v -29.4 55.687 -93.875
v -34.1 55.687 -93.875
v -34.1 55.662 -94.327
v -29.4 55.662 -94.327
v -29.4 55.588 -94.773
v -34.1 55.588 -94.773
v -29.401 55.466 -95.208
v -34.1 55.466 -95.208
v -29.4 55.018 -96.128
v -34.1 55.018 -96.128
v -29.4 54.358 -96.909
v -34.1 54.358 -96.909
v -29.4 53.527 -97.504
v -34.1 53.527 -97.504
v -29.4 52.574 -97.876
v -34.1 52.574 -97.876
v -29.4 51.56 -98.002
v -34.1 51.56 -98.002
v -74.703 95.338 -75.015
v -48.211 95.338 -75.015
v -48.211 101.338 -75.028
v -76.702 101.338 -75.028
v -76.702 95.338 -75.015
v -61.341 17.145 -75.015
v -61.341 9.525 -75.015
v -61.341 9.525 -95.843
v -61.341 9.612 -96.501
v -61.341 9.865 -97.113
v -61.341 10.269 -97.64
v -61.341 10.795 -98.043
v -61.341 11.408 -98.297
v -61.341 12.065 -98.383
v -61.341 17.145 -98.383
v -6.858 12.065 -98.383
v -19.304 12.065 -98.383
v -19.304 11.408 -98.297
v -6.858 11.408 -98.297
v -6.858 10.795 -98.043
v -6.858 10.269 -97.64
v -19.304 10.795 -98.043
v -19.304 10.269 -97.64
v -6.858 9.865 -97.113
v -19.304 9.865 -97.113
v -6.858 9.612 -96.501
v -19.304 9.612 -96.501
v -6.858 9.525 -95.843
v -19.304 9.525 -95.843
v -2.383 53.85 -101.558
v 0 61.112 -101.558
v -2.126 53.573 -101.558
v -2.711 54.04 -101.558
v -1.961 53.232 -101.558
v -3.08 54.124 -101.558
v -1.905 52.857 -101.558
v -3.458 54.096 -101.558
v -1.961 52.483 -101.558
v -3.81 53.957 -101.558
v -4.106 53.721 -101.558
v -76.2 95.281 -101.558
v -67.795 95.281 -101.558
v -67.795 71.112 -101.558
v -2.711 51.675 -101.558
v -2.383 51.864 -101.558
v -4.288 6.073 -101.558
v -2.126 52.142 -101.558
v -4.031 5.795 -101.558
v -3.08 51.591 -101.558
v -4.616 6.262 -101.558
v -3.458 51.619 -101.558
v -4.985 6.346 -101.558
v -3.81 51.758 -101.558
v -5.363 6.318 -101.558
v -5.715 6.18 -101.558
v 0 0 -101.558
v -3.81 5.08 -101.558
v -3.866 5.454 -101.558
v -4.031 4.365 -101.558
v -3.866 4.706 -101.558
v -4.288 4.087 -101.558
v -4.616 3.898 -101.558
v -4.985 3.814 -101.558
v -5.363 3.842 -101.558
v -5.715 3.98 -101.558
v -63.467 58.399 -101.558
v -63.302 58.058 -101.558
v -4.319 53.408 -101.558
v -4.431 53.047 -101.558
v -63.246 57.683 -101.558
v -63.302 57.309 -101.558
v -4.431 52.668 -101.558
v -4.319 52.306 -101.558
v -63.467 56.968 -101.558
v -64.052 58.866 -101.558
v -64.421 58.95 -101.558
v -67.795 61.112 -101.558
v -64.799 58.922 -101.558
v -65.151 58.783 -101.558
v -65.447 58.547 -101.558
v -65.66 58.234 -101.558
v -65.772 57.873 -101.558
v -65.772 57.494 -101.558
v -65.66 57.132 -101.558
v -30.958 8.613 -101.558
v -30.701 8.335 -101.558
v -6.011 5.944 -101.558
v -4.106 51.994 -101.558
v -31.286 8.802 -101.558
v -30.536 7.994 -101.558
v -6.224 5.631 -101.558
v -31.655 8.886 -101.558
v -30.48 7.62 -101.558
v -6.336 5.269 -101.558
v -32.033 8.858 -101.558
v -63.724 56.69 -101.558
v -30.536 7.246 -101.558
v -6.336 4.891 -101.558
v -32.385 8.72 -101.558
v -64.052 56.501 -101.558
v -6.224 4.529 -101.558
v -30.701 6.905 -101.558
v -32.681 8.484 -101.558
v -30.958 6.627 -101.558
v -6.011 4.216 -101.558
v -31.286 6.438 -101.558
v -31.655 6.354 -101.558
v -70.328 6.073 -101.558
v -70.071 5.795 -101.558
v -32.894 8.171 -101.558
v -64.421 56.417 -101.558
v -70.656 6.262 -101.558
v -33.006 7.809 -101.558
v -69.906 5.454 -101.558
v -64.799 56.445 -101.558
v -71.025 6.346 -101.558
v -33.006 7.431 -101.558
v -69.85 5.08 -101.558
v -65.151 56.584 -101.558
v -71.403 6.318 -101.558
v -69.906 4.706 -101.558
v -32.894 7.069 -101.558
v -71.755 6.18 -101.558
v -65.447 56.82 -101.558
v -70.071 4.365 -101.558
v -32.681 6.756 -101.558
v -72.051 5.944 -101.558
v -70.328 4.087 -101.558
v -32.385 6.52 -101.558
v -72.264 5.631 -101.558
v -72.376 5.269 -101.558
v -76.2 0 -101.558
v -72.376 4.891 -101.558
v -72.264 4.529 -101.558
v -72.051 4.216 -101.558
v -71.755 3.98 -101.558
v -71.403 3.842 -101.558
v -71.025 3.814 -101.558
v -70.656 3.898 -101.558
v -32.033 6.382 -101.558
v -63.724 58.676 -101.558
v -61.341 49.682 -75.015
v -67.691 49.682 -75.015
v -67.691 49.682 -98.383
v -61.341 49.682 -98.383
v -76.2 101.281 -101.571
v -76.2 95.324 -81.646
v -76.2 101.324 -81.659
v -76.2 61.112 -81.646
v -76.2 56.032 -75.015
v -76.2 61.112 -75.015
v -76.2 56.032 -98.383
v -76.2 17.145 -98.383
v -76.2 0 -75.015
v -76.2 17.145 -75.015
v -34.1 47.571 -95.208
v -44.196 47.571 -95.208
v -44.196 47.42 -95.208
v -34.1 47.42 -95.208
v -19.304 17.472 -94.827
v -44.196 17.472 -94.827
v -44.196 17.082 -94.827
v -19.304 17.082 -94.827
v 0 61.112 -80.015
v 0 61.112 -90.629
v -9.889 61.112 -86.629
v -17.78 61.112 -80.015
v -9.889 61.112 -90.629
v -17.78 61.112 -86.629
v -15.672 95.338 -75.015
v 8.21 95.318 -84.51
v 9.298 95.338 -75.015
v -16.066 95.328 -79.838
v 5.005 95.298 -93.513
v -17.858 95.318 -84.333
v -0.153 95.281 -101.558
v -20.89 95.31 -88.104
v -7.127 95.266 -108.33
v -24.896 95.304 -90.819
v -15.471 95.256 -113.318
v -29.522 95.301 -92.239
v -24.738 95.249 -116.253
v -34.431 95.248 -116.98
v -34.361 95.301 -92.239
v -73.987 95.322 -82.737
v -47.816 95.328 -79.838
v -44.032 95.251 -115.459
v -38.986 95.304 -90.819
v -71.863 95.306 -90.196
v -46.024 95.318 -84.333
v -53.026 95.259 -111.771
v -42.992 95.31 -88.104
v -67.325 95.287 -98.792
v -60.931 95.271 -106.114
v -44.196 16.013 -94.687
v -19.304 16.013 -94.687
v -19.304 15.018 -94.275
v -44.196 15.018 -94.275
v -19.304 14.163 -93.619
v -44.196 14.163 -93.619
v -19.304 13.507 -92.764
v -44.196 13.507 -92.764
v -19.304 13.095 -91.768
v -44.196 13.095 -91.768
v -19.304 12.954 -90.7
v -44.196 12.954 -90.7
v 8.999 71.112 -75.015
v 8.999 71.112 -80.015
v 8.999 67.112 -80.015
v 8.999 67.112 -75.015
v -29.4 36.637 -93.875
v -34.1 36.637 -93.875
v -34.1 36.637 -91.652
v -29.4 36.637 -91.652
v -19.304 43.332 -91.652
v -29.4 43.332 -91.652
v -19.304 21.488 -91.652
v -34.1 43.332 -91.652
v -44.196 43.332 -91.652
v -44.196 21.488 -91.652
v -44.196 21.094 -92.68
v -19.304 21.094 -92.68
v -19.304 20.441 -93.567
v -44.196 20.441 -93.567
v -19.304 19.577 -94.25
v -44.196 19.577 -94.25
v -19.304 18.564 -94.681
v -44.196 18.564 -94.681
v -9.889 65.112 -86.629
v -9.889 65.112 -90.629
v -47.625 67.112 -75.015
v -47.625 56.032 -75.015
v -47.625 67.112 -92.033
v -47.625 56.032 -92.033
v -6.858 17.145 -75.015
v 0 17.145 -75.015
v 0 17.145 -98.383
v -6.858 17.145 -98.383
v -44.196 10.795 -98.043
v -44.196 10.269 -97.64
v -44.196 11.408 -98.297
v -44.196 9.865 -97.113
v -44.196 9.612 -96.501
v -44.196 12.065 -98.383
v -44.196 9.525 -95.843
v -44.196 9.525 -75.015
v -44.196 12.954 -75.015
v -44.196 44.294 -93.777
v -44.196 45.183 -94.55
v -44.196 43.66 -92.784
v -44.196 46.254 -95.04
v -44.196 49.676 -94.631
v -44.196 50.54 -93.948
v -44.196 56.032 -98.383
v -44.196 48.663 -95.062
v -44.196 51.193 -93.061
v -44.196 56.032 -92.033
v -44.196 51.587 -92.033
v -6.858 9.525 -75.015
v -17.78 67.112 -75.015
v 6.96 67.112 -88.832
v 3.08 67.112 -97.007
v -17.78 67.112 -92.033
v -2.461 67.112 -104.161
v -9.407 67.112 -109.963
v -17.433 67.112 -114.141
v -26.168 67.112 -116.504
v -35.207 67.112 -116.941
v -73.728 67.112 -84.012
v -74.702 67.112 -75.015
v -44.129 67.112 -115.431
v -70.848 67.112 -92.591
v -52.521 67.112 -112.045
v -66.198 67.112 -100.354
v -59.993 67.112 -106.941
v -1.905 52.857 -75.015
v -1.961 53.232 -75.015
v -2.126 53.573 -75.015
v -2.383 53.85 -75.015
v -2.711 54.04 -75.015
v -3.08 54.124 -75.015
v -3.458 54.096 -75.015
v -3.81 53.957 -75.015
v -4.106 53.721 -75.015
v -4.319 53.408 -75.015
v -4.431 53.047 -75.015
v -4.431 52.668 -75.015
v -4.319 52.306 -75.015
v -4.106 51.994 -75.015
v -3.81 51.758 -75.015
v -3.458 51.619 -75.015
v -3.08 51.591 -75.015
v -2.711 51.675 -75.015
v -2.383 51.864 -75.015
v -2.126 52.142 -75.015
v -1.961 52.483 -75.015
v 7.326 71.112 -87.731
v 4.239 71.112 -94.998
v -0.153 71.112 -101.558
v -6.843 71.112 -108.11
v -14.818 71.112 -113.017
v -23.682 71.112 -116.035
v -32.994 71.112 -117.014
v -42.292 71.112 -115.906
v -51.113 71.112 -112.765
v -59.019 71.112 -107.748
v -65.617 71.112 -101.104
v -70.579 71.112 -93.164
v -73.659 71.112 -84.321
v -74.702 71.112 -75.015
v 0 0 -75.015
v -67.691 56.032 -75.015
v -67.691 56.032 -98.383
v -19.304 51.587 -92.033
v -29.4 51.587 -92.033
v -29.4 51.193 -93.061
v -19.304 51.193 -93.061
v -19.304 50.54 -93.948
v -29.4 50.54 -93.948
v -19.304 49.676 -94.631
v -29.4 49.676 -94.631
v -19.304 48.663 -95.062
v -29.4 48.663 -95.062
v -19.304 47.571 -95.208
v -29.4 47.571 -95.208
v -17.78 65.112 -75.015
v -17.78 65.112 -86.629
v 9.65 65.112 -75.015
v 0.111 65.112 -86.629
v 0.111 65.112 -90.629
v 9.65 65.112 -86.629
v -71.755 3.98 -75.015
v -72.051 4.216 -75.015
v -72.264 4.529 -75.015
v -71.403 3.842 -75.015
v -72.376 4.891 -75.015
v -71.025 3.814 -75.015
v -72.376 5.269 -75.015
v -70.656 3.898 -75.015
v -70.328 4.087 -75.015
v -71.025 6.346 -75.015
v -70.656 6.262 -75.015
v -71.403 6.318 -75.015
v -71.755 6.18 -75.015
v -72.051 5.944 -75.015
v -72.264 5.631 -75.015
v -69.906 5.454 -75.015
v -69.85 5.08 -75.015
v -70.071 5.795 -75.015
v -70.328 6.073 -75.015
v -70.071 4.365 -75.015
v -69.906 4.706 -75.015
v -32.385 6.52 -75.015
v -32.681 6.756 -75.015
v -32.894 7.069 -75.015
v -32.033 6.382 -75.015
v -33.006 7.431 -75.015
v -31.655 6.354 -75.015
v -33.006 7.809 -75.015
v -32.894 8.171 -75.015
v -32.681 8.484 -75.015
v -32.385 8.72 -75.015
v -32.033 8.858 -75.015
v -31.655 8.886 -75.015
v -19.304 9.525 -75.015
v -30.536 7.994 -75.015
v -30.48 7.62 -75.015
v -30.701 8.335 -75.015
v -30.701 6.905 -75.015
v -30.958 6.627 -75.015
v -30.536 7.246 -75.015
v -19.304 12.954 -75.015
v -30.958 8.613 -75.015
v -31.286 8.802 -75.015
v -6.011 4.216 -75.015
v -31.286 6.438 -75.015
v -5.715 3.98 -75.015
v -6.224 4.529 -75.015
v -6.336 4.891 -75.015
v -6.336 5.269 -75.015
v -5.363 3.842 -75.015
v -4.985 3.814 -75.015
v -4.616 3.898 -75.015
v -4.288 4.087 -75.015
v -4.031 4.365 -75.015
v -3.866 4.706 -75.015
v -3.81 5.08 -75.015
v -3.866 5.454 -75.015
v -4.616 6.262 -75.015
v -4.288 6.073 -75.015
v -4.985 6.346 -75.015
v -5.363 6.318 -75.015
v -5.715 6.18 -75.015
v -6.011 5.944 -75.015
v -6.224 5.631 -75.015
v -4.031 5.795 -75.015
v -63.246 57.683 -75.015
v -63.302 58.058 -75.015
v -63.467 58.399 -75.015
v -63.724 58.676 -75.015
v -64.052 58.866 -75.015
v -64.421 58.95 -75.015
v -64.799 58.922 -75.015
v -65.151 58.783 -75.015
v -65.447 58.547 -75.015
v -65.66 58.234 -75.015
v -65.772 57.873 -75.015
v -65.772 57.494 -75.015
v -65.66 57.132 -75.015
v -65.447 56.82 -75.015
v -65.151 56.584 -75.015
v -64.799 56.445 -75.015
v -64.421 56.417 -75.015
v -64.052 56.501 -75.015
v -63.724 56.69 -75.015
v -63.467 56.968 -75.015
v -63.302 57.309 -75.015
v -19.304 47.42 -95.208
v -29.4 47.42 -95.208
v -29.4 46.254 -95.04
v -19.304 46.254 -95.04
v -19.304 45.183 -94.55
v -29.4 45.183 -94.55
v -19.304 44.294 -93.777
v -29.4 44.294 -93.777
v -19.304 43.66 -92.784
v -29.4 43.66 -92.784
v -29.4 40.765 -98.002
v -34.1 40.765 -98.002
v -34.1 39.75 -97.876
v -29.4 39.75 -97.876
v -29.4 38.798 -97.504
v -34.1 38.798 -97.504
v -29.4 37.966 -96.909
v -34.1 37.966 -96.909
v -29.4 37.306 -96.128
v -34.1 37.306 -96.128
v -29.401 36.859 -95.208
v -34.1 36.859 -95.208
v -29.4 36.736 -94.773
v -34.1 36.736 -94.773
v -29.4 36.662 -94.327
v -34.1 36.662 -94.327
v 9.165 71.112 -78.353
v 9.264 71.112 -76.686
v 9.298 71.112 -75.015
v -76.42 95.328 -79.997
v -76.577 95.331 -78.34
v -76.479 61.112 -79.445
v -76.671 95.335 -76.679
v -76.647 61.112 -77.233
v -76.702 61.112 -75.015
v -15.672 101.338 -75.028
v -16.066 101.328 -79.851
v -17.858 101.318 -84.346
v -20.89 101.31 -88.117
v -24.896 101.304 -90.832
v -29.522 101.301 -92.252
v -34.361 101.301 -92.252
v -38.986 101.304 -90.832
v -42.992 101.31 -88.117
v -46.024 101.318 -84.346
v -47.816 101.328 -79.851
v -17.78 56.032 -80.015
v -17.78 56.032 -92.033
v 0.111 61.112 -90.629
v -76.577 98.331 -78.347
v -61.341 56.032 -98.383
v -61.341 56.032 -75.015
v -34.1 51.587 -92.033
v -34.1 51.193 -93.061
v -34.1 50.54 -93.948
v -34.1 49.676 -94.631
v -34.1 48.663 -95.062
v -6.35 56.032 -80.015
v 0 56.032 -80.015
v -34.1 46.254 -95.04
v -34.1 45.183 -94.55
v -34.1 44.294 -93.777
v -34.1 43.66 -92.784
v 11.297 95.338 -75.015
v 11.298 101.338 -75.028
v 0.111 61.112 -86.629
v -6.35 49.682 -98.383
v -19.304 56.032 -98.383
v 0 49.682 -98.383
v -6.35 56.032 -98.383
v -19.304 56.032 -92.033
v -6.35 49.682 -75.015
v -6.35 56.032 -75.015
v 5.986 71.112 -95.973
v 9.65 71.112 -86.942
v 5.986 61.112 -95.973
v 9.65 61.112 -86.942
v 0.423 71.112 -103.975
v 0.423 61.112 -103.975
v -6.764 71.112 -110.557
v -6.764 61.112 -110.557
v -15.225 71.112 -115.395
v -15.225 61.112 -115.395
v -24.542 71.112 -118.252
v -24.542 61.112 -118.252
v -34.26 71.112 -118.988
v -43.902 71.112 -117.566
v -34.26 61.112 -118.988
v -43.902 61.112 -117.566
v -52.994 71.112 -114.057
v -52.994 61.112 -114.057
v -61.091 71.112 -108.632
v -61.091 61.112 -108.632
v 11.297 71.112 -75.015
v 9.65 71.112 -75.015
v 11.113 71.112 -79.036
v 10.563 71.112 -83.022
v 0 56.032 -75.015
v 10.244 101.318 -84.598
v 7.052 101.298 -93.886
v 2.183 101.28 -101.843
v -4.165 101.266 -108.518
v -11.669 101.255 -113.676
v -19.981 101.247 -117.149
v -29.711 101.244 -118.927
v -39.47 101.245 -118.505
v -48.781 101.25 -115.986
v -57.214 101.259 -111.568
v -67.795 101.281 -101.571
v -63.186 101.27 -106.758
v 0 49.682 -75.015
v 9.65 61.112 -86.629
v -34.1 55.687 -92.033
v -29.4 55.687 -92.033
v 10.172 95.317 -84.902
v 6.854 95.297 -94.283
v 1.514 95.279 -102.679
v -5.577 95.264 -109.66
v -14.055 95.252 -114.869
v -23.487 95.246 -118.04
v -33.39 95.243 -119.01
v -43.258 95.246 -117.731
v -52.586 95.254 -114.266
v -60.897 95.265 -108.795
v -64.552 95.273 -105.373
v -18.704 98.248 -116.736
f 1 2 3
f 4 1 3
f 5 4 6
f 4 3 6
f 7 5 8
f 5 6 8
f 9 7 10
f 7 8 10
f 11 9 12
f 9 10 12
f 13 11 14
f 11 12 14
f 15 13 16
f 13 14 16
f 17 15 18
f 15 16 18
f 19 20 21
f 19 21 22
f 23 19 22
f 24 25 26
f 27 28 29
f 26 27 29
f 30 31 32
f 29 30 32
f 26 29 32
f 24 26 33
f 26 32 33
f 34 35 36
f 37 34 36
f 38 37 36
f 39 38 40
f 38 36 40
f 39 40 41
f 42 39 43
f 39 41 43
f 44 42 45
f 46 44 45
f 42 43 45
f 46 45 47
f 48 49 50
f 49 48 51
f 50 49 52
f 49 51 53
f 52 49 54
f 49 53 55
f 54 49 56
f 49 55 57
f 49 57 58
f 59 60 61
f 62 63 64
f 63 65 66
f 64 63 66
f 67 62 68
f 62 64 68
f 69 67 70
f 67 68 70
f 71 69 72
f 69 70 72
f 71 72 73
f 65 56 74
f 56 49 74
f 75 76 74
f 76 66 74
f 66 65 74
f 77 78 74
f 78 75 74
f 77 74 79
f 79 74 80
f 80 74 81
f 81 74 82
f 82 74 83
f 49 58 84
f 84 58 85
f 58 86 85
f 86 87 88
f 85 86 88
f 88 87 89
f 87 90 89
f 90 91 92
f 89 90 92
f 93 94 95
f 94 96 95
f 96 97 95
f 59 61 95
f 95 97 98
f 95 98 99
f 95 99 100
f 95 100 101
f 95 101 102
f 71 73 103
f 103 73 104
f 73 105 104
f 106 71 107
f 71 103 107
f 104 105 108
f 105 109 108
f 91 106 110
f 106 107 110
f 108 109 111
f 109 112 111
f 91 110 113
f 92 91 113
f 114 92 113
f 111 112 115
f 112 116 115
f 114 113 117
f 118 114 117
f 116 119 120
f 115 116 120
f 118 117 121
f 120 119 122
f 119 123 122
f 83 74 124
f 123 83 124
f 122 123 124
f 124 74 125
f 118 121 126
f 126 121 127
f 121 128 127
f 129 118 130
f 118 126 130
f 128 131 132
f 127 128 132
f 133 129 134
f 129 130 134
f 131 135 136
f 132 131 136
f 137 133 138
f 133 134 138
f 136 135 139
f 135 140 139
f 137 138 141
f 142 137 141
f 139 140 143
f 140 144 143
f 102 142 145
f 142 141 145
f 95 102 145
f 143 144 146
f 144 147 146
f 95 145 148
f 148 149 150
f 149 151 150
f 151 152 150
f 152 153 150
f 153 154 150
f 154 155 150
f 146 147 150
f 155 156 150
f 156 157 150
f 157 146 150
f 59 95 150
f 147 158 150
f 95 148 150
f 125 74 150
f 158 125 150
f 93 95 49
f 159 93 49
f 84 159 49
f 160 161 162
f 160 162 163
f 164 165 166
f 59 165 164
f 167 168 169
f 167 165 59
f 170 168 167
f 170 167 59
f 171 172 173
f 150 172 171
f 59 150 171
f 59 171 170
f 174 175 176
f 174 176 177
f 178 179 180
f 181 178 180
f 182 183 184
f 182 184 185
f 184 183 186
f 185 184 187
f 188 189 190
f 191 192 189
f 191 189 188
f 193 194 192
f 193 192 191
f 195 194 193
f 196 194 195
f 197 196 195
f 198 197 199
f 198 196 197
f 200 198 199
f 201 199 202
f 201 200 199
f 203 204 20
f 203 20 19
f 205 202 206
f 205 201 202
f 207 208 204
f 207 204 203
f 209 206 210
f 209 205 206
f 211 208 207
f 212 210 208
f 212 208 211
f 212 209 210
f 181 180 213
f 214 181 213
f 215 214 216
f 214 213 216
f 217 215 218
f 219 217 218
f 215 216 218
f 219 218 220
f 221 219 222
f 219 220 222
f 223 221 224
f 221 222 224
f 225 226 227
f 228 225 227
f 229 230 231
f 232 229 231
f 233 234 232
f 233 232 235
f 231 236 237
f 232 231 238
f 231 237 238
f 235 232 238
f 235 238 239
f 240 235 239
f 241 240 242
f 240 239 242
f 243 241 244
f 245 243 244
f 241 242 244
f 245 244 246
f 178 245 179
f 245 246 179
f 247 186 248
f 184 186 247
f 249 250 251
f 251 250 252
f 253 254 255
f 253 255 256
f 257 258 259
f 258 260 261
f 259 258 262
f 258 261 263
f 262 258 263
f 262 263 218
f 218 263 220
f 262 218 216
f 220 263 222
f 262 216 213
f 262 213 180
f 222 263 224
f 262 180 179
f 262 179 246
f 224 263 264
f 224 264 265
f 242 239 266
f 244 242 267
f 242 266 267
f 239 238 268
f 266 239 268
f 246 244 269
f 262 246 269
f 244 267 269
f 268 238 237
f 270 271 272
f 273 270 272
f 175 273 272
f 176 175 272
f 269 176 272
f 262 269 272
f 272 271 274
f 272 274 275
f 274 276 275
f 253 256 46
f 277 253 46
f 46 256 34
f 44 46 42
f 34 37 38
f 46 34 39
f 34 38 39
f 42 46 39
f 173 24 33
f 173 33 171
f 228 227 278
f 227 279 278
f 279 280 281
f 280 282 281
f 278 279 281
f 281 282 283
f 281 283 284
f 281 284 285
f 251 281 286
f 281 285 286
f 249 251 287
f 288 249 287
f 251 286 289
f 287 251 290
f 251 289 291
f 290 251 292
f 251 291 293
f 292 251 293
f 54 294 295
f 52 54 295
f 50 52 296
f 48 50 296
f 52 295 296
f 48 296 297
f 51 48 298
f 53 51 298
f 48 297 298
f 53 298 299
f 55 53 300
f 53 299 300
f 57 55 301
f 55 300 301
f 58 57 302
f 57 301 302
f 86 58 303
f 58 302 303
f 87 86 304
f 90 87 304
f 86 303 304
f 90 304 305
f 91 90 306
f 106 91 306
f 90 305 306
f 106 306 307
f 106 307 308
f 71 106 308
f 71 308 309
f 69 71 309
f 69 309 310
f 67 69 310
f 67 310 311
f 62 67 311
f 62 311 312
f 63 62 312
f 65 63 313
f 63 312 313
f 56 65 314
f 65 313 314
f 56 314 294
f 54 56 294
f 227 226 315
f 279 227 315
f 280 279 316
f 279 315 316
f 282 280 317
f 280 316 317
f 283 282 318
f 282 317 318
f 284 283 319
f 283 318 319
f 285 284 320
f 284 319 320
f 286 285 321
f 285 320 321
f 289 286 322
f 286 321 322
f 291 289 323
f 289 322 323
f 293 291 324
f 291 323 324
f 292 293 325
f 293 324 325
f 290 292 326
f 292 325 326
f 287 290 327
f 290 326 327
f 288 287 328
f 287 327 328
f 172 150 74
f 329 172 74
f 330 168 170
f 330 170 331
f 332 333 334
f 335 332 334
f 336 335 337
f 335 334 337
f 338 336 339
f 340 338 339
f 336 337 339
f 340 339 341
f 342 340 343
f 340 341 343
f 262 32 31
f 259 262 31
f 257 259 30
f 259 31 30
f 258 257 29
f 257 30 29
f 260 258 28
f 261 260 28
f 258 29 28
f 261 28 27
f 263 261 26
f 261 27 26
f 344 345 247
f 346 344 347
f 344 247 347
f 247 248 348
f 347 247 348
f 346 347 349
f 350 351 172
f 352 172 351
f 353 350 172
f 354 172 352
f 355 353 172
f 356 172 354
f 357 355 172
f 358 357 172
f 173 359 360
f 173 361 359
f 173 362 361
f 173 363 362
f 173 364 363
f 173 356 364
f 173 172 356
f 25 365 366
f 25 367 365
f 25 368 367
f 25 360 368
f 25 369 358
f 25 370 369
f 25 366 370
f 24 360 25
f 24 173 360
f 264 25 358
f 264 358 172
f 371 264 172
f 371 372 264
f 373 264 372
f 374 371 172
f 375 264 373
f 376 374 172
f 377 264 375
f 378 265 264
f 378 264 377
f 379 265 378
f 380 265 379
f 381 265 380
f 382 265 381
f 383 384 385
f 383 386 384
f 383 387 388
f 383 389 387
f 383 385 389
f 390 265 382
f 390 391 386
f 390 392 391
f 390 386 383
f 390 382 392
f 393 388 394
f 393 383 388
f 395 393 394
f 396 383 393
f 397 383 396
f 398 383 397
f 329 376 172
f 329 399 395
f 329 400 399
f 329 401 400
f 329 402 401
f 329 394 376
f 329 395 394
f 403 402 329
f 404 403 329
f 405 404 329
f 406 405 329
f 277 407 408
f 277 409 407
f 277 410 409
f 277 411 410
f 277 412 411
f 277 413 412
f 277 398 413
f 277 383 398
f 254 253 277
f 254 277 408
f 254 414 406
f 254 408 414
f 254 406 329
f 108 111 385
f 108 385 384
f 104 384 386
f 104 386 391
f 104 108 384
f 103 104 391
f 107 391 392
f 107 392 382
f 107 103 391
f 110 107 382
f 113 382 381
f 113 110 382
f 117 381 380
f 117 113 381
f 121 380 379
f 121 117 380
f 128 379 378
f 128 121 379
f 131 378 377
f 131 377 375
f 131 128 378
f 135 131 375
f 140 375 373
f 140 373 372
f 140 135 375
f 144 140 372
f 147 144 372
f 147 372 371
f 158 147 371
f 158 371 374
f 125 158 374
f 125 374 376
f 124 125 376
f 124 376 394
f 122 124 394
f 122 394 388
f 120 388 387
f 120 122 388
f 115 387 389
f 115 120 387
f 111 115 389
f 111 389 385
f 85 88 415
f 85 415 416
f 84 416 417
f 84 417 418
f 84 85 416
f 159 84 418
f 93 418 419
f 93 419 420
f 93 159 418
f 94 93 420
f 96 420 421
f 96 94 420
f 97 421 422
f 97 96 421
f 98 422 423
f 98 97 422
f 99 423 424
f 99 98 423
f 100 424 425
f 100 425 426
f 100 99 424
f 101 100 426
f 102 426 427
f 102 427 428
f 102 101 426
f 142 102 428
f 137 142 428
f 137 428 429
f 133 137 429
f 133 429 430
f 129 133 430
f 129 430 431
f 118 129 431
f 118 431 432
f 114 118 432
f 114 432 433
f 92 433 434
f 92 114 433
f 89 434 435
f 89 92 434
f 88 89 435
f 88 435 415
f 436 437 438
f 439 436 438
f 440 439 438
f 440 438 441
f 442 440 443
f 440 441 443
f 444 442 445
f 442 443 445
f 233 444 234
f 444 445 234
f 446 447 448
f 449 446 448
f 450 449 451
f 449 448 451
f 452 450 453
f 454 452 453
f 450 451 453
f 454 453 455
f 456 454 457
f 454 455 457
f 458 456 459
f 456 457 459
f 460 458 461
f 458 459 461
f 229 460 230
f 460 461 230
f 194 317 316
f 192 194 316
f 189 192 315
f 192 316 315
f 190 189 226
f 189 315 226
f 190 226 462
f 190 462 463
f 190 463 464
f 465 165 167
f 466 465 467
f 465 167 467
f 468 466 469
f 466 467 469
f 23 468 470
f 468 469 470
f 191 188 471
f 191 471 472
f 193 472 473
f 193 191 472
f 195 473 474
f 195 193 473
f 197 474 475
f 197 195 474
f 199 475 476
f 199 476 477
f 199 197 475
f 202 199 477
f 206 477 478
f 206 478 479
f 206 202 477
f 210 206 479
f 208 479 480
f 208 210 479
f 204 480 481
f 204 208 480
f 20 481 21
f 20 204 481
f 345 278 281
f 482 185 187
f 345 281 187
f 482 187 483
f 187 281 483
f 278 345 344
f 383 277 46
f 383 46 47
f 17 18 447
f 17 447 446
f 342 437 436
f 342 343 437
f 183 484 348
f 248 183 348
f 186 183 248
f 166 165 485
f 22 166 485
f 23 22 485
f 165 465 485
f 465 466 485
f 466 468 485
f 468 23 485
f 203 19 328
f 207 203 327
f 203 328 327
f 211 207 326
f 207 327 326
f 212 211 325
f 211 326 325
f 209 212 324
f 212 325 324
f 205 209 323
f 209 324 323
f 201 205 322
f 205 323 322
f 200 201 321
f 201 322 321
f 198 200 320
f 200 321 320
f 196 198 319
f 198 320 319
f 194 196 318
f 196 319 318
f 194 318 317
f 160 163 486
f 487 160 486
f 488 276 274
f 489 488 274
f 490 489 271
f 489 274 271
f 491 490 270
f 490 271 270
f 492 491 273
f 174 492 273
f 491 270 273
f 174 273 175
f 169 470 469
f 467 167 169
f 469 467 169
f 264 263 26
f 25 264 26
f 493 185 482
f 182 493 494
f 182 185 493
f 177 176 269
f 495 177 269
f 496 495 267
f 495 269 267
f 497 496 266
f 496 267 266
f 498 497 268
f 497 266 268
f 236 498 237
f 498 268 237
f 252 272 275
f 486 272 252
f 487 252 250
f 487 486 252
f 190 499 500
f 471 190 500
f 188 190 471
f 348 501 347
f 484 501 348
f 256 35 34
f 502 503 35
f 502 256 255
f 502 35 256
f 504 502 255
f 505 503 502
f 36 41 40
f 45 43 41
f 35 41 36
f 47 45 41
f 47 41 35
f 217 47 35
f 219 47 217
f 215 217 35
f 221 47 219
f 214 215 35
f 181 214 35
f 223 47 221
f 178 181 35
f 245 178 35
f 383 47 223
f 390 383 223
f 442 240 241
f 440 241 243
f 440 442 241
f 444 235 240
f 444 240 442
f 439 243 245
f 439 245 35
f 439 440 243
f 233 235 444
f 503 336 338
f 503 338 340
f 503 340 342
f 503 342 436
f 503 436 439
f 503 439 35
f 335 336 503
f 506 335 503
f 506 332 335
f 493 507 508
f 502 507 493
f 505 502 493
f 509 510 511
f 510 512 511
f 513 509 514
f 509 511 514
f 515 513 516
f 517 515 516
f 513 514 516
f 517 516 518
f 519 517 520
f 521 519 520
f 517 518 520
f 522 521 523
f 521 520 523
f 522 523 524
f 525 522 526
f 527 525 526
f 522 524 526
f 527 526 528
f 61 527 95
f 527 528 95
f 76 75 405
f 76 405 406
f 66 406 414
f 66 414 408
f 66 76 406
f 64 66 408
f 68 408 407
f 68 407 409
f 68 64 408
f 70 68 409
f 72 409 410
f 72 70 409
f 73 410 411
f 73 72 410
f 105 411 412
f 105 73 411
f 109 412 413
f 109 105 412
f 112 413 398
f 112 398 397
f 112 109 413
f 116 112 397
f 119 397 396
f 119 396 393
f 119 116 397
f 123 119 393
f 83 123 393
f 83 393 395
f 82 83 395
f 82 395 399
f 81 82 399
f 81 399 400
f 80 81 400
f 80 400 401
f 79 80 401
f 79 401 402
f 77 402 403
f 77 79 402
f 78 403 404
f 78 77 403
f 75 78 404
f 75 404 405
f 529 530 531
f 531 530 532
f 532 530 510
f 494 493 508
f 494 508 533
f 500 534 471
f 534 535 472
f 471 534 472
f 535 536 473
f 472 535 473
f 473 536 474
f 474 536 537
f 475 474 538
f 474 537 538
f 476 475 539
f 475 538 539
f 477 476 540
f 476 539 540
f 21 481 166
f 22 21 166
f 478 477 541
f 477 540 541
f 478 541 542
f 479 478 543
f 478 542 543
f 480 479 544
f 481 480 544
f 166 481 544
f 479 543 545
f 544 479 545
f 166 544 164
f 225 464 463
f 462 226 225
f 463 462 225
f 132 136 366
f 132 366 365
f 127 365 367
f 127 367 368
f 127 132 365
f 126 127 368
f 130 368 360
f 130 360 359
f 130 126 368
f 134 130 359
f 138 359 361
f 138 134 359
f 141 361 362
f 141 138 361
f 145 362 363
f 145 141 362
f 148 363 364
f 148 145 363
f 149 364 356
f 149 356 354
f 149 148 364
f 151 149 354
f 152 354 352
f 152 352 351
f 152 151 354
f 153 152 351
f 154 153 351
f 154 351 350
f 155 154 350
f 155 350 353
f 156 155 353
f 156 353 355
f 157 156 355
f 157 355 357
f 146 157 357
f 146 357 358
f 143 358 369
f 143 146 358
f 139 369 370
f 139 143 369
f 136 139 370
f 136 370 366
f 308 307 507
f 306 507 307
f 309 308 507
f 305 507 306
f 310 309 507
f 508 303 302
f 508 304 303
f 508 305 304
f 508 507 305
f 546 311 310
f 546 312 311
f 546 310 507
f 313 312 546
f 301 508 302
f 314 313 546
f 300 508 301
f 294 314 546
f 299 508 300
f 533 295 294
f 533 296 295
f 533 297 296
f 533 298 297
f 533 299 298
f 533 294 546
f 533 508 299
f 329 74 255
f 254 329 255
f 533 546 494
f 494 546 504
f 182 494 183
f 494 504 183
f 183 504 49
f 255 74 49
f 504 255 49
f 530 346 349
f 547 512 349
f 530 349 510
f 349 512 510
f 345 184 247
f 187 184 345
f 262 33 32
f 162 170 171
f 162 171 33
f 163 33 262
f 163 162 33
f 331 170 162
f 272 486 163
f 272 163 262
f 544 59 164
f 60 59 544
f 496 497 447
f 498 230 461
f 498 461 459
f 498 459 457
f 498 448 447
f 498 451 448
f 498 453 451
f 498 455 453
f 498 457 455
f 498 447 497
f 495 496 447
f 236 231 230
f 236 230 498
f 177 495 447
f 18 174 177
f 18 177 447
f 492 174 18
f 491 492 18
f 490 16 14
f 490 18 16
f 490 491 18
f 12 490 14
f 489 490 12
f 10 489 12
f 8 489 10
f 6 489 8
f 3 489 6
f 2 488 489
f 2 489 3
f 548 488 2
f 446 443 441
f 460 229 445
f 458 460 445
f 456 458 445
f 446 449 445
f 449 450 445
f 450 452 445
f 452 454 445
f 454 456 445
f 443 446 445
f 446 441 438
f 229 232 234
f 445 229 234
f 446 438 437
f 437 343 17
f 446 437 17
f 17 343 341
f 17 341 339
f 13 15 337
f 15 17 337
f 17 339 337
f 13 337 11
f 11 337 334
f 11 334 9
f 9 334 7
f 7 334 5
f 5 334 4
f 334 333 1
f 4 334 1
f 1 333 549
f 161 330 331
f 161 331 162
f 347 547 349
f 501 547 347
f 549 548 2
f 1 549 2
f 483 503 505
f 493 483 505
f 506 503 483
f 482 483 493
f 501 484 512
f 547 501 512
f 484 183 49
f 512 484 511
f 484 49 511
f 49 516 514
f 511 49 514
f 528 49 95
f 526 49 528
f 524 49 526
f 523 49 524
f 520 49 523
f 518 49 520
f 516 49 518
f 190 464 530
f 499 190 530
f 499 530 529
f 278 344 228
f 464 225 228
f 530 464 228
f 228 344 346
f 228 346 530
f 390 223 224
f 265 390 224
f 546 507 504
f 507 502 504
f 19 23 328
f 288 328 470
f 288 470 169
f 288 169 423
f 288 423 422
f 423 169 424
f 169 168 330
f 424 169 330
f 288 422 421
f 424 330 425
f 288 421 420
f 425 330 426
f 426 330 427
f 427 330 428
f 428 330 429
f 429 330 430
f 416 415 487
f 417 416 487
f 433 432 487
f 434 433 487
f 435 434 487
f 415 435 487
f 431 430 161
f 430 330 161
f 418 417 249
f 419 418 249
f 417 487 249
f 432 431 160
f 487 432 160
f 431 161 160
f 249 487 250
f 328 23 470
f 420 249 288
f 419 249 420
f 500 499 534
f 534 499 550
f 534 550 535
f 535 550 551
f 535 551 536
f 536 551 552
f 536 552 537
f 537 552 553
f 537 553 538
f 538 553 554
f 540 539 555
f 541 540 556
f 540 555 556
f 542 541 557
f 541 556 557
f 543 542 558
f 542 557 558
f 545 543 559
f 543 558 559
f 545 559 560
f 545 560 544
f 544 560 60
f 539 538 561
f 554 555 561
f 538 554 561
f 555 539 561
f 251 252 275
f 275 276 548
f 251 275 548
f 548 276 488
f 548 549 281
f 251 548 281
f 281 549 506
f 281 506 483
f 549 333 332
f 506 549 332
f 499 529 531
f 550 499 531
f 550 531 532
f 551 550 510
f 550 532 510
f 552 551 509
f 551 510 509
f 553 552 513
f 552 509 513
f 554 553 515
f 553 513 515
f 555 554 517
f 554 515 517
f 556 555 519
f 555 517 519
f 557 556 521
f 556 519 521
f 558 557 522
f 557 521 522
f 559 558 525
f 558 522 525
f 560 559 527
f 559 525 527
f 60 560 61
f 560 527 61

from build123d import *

# Parameters (mm, degrees)
BOSS_EXTRUDE4_START        = -101.558494002
BOSS_EXTRUDE4_OUTLINE_R    = 1.27
BOSS_EXTRUDE4_DEPTH        = 26.543
BOSS_EXTRUDE4_2_DEPTH      = 3.175
BOSS_EXTRUDE4_START_2      = -98.383494002
BOSS_EXTRUDE4_3_OUTLINE_W  = 4.699
BOSS_EXTRUDE4_3_OUTLINE_H  = 19.05
BOSS_EXTRUDE4_3_DEPTH      = 3.175
BOSS_EXTRUDE4_START_3      = -86.941966379
BOSS_EXTRUDE4_4_OUTLINE_W  = 27.430295146
BOSS_EXTRUDE4_4_OUTLINE_H  = 6
BOSS_EXTRUDE4_4_DEPTH      = 6.926472377
BOSS_EXTRUDE4_START_4      = -95.208494002
BOSS_EXTRUDE4_5_OUTLINE_W  = 29.845
BOSS_EXTRUDE4_5_OUTLINE_H  = 6
BOSS_EXTRUDE4_5_DEPTH      = 3.175
BOSS_EXTRUDE4_6_OUTLINE_W  = 4.699
BOSS_EXTRUDE4_6_OUTLINE_H  = 19.05
BOSS_EXTRUDE4_6_DEPTH      = 0.381
BOSS_EXTRUDE4_START_5      = -44.196
BOSS_EXTRUDE4_7_DEPTH      = 24.892
BOSS_EXTRUDE4_8_DEPTH      = 10.0965
BOSS_EXTRUDE4_START_6      = -29.4005
BOSS_EXTRUDE4_9_DEPTH      = 10.0965
BOSS_EXTRUDE4_START_7      = -62
BOSS_EXTRUDE4_10_OUTLINE_W = 5.08
BOSS_EXTRUDE4_10_OUTLINE_H = 3.175
BOSS_EXTRUDE4_10_DEPTH     = 56
BOSS_EXTRUDE4_START_8      = 61.1124
BOSS_EXTRUDE4_11_DEPTH     = 6
BOSS_EXTRUDE4_START_9      = 56.0324
BOSS_EXTRUDE4_12_OUTLINE_W = 29.845
BOSS_EXTRUDE4_12_OUTLINE_H = 3.175
BOSS_EXTRUDE4_12_DEPTH     = 5.08
BOSS_EXTRUDE4_START_10     = 55.687225257
BOSS_EXTRUDE4_13_OUTLINE_W = 24.892
BOSS_EXTRUDE4_13_OUTLINE_H = 3.175
BOSS_EXTRUDE4_13_DEPTH     = 1.422815543
BOSS_EXTRUDE5_DEPTH        = 4
INDENT2_START              = 61.1124
INDENT2_DEPTH              = 4
CUT_EXTRUDE1_DEPTH         = 5
BOSS_EXTRUDE6_DEPTH        = 21.543
SKETCH18_W                 = 6.35
SKETCH18_H                 = 6.35
BOSS_EXTRUDE7_DEPTH        = 5
SKETCH19_R                 = 1.27
CUT_EXTRUDE2_DEPTH         = 26.543
SKETCH20_R                 = 42
CUT_EXTRUDE3_DEPTH         = 4
BOSS_EXTRUDE9_DEPTH        = 5
BOSS_EXTRUDE10_DEPTH       = 24.225897016
BOSS_EXTRUDE10_START       = 95.499839318
BOSS_EXTRUDE10_2_OUTLINE_W = 91
BOSS_EXTRUDE10_2_OUTLINE_H = 47
BOSS_EXTRUDE10_2_DEPTH     = 1.500160682
BOSS_EXTRUDE11_DEPTH       = 6


with BuildPart() as part:
    # Boss-Extrude4: read off the stored shape, not the designer's step
    # Boss-Extrude4 outline → Boss-Extrude4 (new body)
    # profile 1 of 3: a face of its own
    with BuildSketch(Plane.XY.offset(BOSS_EXTRUDE4_START)):
        Polygon((0, 61.1124), (-17.78, 61.1124), (-17.78, 56.0324), (-6.35, 56.0324), (-6.35, 49.6824), (0, 49.6824), align=None)
        with Locations((-3.81, 58.5724)):
            Circle(BOSS_EXTRUDE4_OUTLINE_R, mode=Mode.SUBTRACT)
    # profile 2 of 3: a face of its own
    with BuildSketch(Plane.XY.offset(BOSS_EXTRUDE4_START)):
        Polygon((-47.625, 56.0324), (-47.625, 61.1124), (-47.625, 67.1124), (-76.2, 67.1124), (-76.2, 56.0324), (-67.691, 56.0324), (-67.691, 49.6824), (-61.341, 49.6824), (-61.341, 56.0324), align=None)
        with Locations((-64.516, 57.6834)):
            Circle(BOSS_EXTRUDE4_OUTLINE_R, mode=Mode.SUBTRACT)
    # profile 3 of 3: a face of its own
    with BuildSketch(Plane.XY.offset(BOSS_EXTRUDE4_START)):
        Polygon((0, 0), (0, 17.145), (-6.858, 17.145), (-6.858, 9.525), (-19.304, 9.525), (-19.304, 12.954), (-44.196, 12.954), (-44.196, 9.525), (-61.341, 9.525), (-61.341, 17.145), (-76.2, 17.145), (-76.2, 0), align=None)
        with Locations((-71.12, 5.08)):
            Circle(BOSS_EXTRUDE4_OUTLINE_R, mode=Mode.SUBTRACT)
        with Locations((-31.75, 7.62)):
            Circle(BOSS_EXTRUDE4_OUTLINE_R, mode=Mode.SUBTRACT)
        with Locations((-5.08, 5.08)):
            Circle(BOSS_EXTRUDE4_OUTLINE_R, mode=Mode.SUBTRACT)
    extrude(amount=BOSS_EXTRUDE4_DEPTH)

    # Boss-Extrude4 2 outline → Boss-Extrude4 2 (add)
    with BuildSketch(Plane.XY.offset(BOSS_EXTRUDE4_START)):
        Polygon((-47.625, 67.1124), (-47.625, 56.0324), (-61.341, 56.0324), (-61.341, 49.6824), (-67.691, 49.6824), (-67.691, 56.0324), (-76.2, 56.0324), (-76.2, 17.145), (-61.341, 17.145), (-61.341, 9.525), (-44.196, 9.525), (-44.196, 12.954), (-19.304, 12.954), (-19.304, 9.525), (-6.858, 9.525), (-6.858, 17.145), (0, 17.145), (0, 49.6824), (-6.35, 49.6824), (-6.35, 56.0324), (-17.78, 56.0324), (-17.78, 67.1124), align=None)
    extrude(amount=BOSS_EXTRUDE4_2_DEPTH)

    # Boss-Extrude4 3 outline → Boss-Extrude4 3 (add)
    with BuildSketch(Plane.XY.offset(BOSS_EXTRUDE4_START_2)):
        Polygon((-47.625, 67.1124), (-47.625, 56.0324), (-44.196, 56.0324), (-44.196, 12.954), (-19.304, 12.954), (-19.304, 56.0324), (-17.78, 56.0324), (-17.78, 67.1124), align=None)
        with Locations((-31.75, 46.162225257)):
            Rectangle(BOSS_EXTRUDE4_3_OUTLINE_W, BOSS_EXTRUDE4_3_OUTLINE_H, mode=Mode.SUBTRACT)
    extrude(amount=BOSS_EXTRUDE4_3_DEPTH)

    # Boss-Extrude4 4 outline → Boss-Extrude4 4 (add)
    with BuildSketch(Plane.XY.offset(BOSS_EXTRUDE4_START_3)):
        with Locations((-4.064852427, 64.1124)):
            Rectangle(BOSS_EXTRUDE4_4_OUTLINE_W, BOSS_EXTRUDE4_4_OUTLINE_H)
    extrude(amount=BOSS_EXTRUDE4_4_DEPTH)

    # Boss-Extrude4 5 outline → Boss-Extrude4 5 (add)
    with BuildSketch(Plane.XY.offset(BOSS_EXTRUDE4_START_4)):
        with Locations((-32.7025, 64.1124)):
            Rectangle(BOSS_EXTRUDE4_5_OUTLINE_W, BOSS_EXTRUDE4_5_OUTLINE_H)
    extrude(amount=BOSS_EXTRUDE4_5_DEPTH)

    # Boss-Extrude4 6 outline → Boss-Extrude4 6 (add)
    with BuildSketch(Plane.XY.offset(BOSS_EXTRUDE4_START_2)):
        with Locations((-31.75, 46.162225257)):
            Rectangle(BOSS_EXTRUDE4_6_OUTLINE_W, BOSS_EXTRUDE4_6_OUTLINE_H)
    extrude(amount=BOSS_EXTRUDE4_6_DEPTH)

    # Boss-Extrude4 7 outline → Boss-Extrude4 7 (add)
    with BuildSketch(Plane.YZ.offset(BOSS_EXTRUDE4_START_5)):
        with BuildLine():
            Line((55.687225257, -92.033494002), (55.687225257, -93.874994002))
            ThreePointArc((55.687225257, -93.874994002), (54.478308496, -96.793577242), (51.559725257, -98.002494002))
            Line((51.559725257, -98.002494002), (55.687225257, -98.002494002))
            Line((55.687225257, -98.002494002), (55.687225257, -95.208494002))
            Line((55.687225257, -95.208494002), (61.1124, -95.208494002))
            Line((61.1124, -95.208494002), (61.1124, -92.033494002))
            Line((61.1124, -92.033494002), (55.687225257, -92.033494002))
        make_face()
        with BuildLine():
            Line((12.954, -95.208494002), (36.637225257, -95.208494002))
            Line((36.637225257, -95.208494002), (36.637225257, -98.002494002))
            Line((36.637225257, -98.002494002), (40.764725257, -98.002494002))
            ThreePointArc((40.764725257, -98.002494002), (37.846142018, -96.793577242), (36.637225257, -93.874994002))
            Line((36.637225257, -93.874994002), (36.637225257, -91.652494002))
            Line((36.637225257, -91.652494002), (21.4884, -91.652494002))
            ThreePointArc((21.4884, -91.652494002), (20.032074207, -93.937871393), (17.472307372, -94.827494002))
            Line((17.472307372, -94.827494002), (17.0815, -94.827494002))
            ThreePointArc((17.0815, -94.827494002), (14.16291676, -93.618577241), (12.954, -90.699994002))
            Line((12.954, -90.699994002), (12.954, -95.208494002))
        make_face()
    extrude(amount=BOSS_EXTRUDE4_7_DEPTH)

    # Boss-Extrude4 8 outline → Boss-Extrude4 8 (add)
    with BuildSketch(Plane.YZ.offset(BOSS_EXTRUDE4_START_5)):
        with BuildLine():
            Line((55.687225257, -92.033494002), (51.5874, -92.033494002))
            ThreePointArc((51.5874, -92.033494002), (50.131074207, -94.318871393), (47.571307372, -95.208494002))
            Line((47.571307372, -95.208494002), (55.465878608, -95.208494002))
            ThreePointArc((55.465878608, -95.208494002), (55.631512592, -94.55086688), (55.687225257, -93.874994002))
            Line((55.687225257, -93.874994002), (55.687225257, -92.033494002))
        make_face()
        with BuildLine():
            Line((36.858571906, -95.208494002), (47.420143143, -95.208494002))
            ThreePointArc((47.420143143, -95.208494002), (44.711140559, -94.19508476), (43.3324, -91.652494002))
            Line((43.3324, -91.652494002), (36.637225257, -91.652494002))
            Line((36.637225257, -91.652494002), (36.637225257, -93.874994002))
            ThreePointArc((36.637225257, -93.874994002), (36.692937922, -94.55086688), (36.858571906, -95.208494002))
        make_face()
    extrude(amount=BOSS_EXTRUDE4_8_DEPTH)

    # Boss-Extrude4 9 outline → Boss-Extrude4 9 (add)
    with BuildSketch(Plane.YZ.offset(BOSS_EXTRUDE4_START_6)):
        with BuildLine():
            Line((55.687225257, -92.033494002), (51.5874, -92.033494002))
            ThreePointArc((51.5874, -92.033494002), (50.131074207, -94.318871393), (47.571307372, -95.208494002))
            Line((47.571307372, -95.208494002), (55.465878608, -95.208494002))
            ThreePointArc((55.465878608, -95.208494002), (55.631512592, -94.55086688), (55.687225257, -93.874994002))
            Line((55.687225257, -93.874994002), (55.687225257, -92.033494002))
        make_face()
        with BuildLine():
            Line((36.858571906, -95.208494002), (47.420143143, -95.208494002))
            ThreePointArc((47.420143143, -95.208494002), (44.711140559, -94.19508476), (43.3324, -91.652494002))
            Line((43.3324, -91.652494002), (36.637225257, -91.652494002))
            Line((36.637225257, -91.652494002), (36.637225257, -93.874994002))
            ThreePointArc((36.637225257, -93.874994002), (36.692937922, -94.55086688), (36.858571906, -95.208494002))
        make_face()
    extrude(amount=BOSS_EXTRUDE4_9_DEPTH)

    # Boss-Extrude4 10 outline → Boss-Extrude4 10 (add)
    with BuildSketch(Plane.YZ.offset(BOSS_EXTRUDE4_START_7)):
        with Locations((58.5724, -93.620994002)):
            Rectangle(BOSS_EXTRUDE4_10_OUTLINE_W, BOSS_EXTRUDE4_10_OUTLINE_H)
        with BuildLine():
            Line((9.525, -98.383494002), (12.065, -98.383494002))
            ThreePointArc((12.065, -98.383494002), (10.268948776, -97.639545226), (9.525, -95.843494002))
            Line((9.525, -95.843494002), (9.525, -98.383494002))
        make_face()
    extrude(amount=BOSS_EXTRUDE4_10_DEPTH)

    # Boss-Extrude4 11 outline → Boss-Extrude4 11 (add)
    with BuildSketch(Plane(origin=(0, 0, 0), x_dir=(1, 0, 0), z_dir=(0, 1, 0)).offset(BOSS_EXTRUDE4_START_8)):
        with BuildLine():
            ThreePointArc((-76.2, 81.646292879), (-76.576695149, 78.340400016), (-76.7025, 75.015494002))
            Line((-76.7025, 75.015494002), (-76.2, 75.015494002))
            Line((-76.2, 75.015494002), (-76.2, 81.646292879))
        make_face()
        with BuildLine():
            ThreePointArc((9.650295146, 86.941966379), (-24.542264928, 118.252174767), (-67.794794753, 101.558494002))
            Line((-67.794794753, 101.558494002), (-17.78, 101.558494002))
            Line((-17.78, 101.558494002), (-17.78, 86.941966379))
            Line((-17.78, 86.941966379), (9.650295146, 86.941966379))
        make_face()
    extrude(amount=BOSS_EXTRUDE4_11_DEPTH)

    # Boss-Extrude4 12 outline → Boss-Extrude4 12 (add)
    with BuildSketch(Plane(origin=(0, 0, 0), x_dir=(1, 0, 0), z_dir=(0, 1, 0)).offset(BOSS_EXTRUDE4_START_9)):
        with Locations((-32.7025, 93.620994002)):
            Rectangle(BOSS_EXTRUDE4_12_OUTLINE_W, BOSS_EXTRUDE4_12_OUTLINE_H)
    extrude(amount=BOSS_EXTRUDE4_12_DEPTH)

    # Boss-Extrude4 13 outline → Boss-Extrude4 13 (add)
    with BuildSketch(Plane(origin=(0, 0, 0), x_dir=(1, 0, 0), z_dir=(0, 1, 0)).offset(BOSS_EXTRUDE4_START_10)):
        with Locations((-31.75, 93.620994002)):
            Rectangle(BOSS_EXTRUDE4_13_OUTLINE_W, BOSS_EXTRUDE4_13_OUTLINE_H)
    extrude(amount=BOSS_EXTRUDE4_13_DEPTH)

    # Sketch11 → Boss-Extrude5 (add)
    with BuildSketch(Plane(origin=(0, 67.1124, 0), x_dir=(1, 0, 0), z_dir=(0, 1, 0))):
        with BuildLine():
            Line((-17.78, 80.015494002), (9.650295146, 80.015494002))
            Line((9.650295146, 80.015494002), (9.650295146, 86.941966379))
            ThreePointArc((9.650295146, 86.941966379), (-24.542264928, 118.252174767), (-67.794794753, 101.558494002))
            Line((-67.794794753, 101.558494002), (-76.2, 101.558494002))
            Line((-76.2, 101.558494002), (-76.2, 81.646292879))
            ThreePointArc((-76.2, 81.646292879), (-76.576695149, 78.340400016), (-76.7025, 75.015494002))
            Line((-76.7025, 75.015494002), (-47.625, 75.015494002))
            Line((-47.625, 75.015494002), (-47.625, 92.033494002))
            Line((-47.625, 92.033494002), (-17.78, 92.033494002))
            Line((-17.78, 92.033494002), (-17.78, 80.015494002))
        make_face()
    extrude(amount=BOSS_EXTRUDE5_DEPTH)

    # Indent2: read off the stored shape, not the designer's step
    # Indent2 outline → Indent2 (cut)
    with BuildSketch(Plane(origin=(0, 0, 0), x_dir=(1, 0, 0), z_dir=(0, 1, 0)).offset(INDENT2_START)):
        Polygon((-9.889050862, 86.629325085), (-17.78, 86.629325085), (-17.78, 80.015494002), (9.650295146, 80.015494002), (9.650295146, 86.629325085), (0.110949138, 86.629325085), (0.110949138, 90.629325085), (-9.889050862, 90.629325085), align=None)
    extrude(amount=INDENT2_DEPTH, mode=Mode.SUBTRACT)

    # Sketch16 → Cut-Extrude1 (cut)
    with BuildSketch(Plane.XY.offset(-75.015494002)):
        Polygon((0, 61.1124), (-17.78, 61.1124), (-17.78, 56.0324), (-6.35, 56.0324), (-6.35, 49.6824), (0, 49.6824), align=None)
    extrude(amount=-CUT_EXTRUDE1_DEPTH, mode=Mode.SUBTRACT)

    # Sketch17 → Boss-Extrude6 (add)
    with BuildSketch(Plane.XY.offset(-80.015494002)):
        Polygon((0, 49.6824), (0, 61.1124), (-17.78, 61.1124), (-17.78, 56.0324), (-6.35, 56.0324), (-6.35, 49.6824), align=None)
    extrude(amount=-BOSS_EXTRUDE6_DEPTH)

    # Sketch18 → Boss-Extrude7 (add)
    with BuildSketch(Plane.XY.offset(-80.015494002)):
        with Locations((-3.175, 52.8574)):
            Rectangle(SKETCH18_W, SKETCH18_H)
    extrude(amount=BOSS_EXTRUDE7_DEPTH)

    # Sketch19 → Cut-Extrude2 (cut)
    with BuildSketch(Plane.XY.offset(-75.015494002)):
        with Locations((-3.175, 52.8574)):
            Circle(SKETCH19_R)
    extrude(amount=-CUT_EXTRUDE2_DEPTH, mode=Mode.SUBTRACT)

    # Sketch20 → Cut-Extrude3 (cut)
    with BuildSketch(Plane(origin=(0, 71.1124, 0), x_dir=(1, 0, 0), z_dir=(0, 1, 0))):
        with Locations((-32.7025, 75.015494002)):
            Circle(SKETCH20_R)
    extrude(amount=-CUT_EXTRUDE3_DEPTH, mode=Mode.SUBTRACT)

    # Sketch23 → Boss-Extrude9 (add)
    with BuildSketch(Plane.XY.offset(-80.015494002)):
        Polygon((9.650295146, 71.1124), (8.998818924, 71.1124), (8.998818924, 67.1124), (-17.78, 67.1124), (-17.78, 65.1124), (9.650295146, 65.1124), align=None)
    extrude(amount=BOSS_EXTRUDE9_DEPTH)

    # Boss-Extrude10: read off the stored shape, not the designer's step
    # Boss-Extrude10 outline → Boss-Extrude10 (add)
    with BuildSketch(Plane(origin=(0, 71.1124, 0), x_dir=(1, 0, 0), z_dir=(0, 1, 0))):
        with BuildLine():
            ThreePointArc((-74.7025, 75.015494002), (-46.790110082, 114.582389788), (-0.153012277, 101.558494002))
            ThreePointArc((-0.153012277, 101.558494002), (6.864395786, 89.103104084), (9.2975, 75.015494002))
            Line((9.2975, 75.015494002), (11.2975, 75.015494002))
            ThreePointArc((11.2975, 75.015494002), (-18.703588777, 116.729166635), (-67.794794753, 101.558494002))
            Line((-67.794794753, 101.558494002), (-76.2, 101.558494002))
            Line((-76.2, 101.558494002), (-76.2, 81.646292879))
            ThreePointArc((-76.2, 81.646292879), (-76.576695149, 78.340400016), (-76.7025, 75.015494002))
            Line((-76.7025, 75.015494002), (-74.7025, 75.015494002))
        make_face()
    extrude(amount=BOSS_EXTRUDE10_DEPTH)

    # Boss-Extrude10 2 outline → Boss-Extrude10 2 (cut)
    with BuildSketch(Plane(origin=(0, 0, 0), x_dir=(1, 0, 0), z_dir=(0, 0.9999976749508124, -0.0021564074219559007)).offset(BOSS_EXTRUDE10_START)):
        with Locations((-32.5, 96.5)):
            Rectangle(BOSS_EXTRUDE10_2_OUTLINE_W, BOSS_EXTRUDE10_2_OUTLINE_H)
    extrude(amount=BOSS_EXTRUDE10_2_DEPTH, mode=Mode.SUBTRACT)

    # Sketch26 → Boss-Extrude11 (add)
    with BuildSketch(Plane(origin=(0, 95.499617276, -0.205936562), x_dir=(1, 0, 0), z_dir=(0, 0.9999976749508124, -0.002156407421956261))):
        with BuildLine():
            Line((11.2975, 74.809731376), (-15.671546302, 74.809731376))
            ThreePointArc((-15.671546302, 74.809731376), (-31.94102841, 92.21425616), (-48.210510518, 74.809731376))
            Line((-48.210510518, 74.809731376), (-76.7025, 74.809731376))
            add(Edge.make_bspline(
                [(-76.2, 81.44054567), (-76.7025, 78.144178977), (-76.7025, 74.809731376)],
                knots=[1.419520031, 1.419520031, 1.419520031, 1.570796327, 1.570796327, 1.570796327], degree=2, weights=[1, 0.997140799, 1]))
            Line((-76.2, 81.44054567), (-76.2, 101.35279309))
            Line((-76.2, 101.35279309), (-67.794794753, 101.35279309))
            add(Edge.make_bspline(
                [(11.2975, 74.809731376), (11.2975, 205.920346621), (-67.794794753, 101.35279309)],
                knots=[4.71238898, 4.71238898, 4.71238898, 7.206411806, 7.206411806, 7.206411806], degree=2, weights=[1, 0.318157073, 1]))
        make_face()
    extrude(amount=BOSS_EXTRUDE11_DEPTH)


solid = part.part
